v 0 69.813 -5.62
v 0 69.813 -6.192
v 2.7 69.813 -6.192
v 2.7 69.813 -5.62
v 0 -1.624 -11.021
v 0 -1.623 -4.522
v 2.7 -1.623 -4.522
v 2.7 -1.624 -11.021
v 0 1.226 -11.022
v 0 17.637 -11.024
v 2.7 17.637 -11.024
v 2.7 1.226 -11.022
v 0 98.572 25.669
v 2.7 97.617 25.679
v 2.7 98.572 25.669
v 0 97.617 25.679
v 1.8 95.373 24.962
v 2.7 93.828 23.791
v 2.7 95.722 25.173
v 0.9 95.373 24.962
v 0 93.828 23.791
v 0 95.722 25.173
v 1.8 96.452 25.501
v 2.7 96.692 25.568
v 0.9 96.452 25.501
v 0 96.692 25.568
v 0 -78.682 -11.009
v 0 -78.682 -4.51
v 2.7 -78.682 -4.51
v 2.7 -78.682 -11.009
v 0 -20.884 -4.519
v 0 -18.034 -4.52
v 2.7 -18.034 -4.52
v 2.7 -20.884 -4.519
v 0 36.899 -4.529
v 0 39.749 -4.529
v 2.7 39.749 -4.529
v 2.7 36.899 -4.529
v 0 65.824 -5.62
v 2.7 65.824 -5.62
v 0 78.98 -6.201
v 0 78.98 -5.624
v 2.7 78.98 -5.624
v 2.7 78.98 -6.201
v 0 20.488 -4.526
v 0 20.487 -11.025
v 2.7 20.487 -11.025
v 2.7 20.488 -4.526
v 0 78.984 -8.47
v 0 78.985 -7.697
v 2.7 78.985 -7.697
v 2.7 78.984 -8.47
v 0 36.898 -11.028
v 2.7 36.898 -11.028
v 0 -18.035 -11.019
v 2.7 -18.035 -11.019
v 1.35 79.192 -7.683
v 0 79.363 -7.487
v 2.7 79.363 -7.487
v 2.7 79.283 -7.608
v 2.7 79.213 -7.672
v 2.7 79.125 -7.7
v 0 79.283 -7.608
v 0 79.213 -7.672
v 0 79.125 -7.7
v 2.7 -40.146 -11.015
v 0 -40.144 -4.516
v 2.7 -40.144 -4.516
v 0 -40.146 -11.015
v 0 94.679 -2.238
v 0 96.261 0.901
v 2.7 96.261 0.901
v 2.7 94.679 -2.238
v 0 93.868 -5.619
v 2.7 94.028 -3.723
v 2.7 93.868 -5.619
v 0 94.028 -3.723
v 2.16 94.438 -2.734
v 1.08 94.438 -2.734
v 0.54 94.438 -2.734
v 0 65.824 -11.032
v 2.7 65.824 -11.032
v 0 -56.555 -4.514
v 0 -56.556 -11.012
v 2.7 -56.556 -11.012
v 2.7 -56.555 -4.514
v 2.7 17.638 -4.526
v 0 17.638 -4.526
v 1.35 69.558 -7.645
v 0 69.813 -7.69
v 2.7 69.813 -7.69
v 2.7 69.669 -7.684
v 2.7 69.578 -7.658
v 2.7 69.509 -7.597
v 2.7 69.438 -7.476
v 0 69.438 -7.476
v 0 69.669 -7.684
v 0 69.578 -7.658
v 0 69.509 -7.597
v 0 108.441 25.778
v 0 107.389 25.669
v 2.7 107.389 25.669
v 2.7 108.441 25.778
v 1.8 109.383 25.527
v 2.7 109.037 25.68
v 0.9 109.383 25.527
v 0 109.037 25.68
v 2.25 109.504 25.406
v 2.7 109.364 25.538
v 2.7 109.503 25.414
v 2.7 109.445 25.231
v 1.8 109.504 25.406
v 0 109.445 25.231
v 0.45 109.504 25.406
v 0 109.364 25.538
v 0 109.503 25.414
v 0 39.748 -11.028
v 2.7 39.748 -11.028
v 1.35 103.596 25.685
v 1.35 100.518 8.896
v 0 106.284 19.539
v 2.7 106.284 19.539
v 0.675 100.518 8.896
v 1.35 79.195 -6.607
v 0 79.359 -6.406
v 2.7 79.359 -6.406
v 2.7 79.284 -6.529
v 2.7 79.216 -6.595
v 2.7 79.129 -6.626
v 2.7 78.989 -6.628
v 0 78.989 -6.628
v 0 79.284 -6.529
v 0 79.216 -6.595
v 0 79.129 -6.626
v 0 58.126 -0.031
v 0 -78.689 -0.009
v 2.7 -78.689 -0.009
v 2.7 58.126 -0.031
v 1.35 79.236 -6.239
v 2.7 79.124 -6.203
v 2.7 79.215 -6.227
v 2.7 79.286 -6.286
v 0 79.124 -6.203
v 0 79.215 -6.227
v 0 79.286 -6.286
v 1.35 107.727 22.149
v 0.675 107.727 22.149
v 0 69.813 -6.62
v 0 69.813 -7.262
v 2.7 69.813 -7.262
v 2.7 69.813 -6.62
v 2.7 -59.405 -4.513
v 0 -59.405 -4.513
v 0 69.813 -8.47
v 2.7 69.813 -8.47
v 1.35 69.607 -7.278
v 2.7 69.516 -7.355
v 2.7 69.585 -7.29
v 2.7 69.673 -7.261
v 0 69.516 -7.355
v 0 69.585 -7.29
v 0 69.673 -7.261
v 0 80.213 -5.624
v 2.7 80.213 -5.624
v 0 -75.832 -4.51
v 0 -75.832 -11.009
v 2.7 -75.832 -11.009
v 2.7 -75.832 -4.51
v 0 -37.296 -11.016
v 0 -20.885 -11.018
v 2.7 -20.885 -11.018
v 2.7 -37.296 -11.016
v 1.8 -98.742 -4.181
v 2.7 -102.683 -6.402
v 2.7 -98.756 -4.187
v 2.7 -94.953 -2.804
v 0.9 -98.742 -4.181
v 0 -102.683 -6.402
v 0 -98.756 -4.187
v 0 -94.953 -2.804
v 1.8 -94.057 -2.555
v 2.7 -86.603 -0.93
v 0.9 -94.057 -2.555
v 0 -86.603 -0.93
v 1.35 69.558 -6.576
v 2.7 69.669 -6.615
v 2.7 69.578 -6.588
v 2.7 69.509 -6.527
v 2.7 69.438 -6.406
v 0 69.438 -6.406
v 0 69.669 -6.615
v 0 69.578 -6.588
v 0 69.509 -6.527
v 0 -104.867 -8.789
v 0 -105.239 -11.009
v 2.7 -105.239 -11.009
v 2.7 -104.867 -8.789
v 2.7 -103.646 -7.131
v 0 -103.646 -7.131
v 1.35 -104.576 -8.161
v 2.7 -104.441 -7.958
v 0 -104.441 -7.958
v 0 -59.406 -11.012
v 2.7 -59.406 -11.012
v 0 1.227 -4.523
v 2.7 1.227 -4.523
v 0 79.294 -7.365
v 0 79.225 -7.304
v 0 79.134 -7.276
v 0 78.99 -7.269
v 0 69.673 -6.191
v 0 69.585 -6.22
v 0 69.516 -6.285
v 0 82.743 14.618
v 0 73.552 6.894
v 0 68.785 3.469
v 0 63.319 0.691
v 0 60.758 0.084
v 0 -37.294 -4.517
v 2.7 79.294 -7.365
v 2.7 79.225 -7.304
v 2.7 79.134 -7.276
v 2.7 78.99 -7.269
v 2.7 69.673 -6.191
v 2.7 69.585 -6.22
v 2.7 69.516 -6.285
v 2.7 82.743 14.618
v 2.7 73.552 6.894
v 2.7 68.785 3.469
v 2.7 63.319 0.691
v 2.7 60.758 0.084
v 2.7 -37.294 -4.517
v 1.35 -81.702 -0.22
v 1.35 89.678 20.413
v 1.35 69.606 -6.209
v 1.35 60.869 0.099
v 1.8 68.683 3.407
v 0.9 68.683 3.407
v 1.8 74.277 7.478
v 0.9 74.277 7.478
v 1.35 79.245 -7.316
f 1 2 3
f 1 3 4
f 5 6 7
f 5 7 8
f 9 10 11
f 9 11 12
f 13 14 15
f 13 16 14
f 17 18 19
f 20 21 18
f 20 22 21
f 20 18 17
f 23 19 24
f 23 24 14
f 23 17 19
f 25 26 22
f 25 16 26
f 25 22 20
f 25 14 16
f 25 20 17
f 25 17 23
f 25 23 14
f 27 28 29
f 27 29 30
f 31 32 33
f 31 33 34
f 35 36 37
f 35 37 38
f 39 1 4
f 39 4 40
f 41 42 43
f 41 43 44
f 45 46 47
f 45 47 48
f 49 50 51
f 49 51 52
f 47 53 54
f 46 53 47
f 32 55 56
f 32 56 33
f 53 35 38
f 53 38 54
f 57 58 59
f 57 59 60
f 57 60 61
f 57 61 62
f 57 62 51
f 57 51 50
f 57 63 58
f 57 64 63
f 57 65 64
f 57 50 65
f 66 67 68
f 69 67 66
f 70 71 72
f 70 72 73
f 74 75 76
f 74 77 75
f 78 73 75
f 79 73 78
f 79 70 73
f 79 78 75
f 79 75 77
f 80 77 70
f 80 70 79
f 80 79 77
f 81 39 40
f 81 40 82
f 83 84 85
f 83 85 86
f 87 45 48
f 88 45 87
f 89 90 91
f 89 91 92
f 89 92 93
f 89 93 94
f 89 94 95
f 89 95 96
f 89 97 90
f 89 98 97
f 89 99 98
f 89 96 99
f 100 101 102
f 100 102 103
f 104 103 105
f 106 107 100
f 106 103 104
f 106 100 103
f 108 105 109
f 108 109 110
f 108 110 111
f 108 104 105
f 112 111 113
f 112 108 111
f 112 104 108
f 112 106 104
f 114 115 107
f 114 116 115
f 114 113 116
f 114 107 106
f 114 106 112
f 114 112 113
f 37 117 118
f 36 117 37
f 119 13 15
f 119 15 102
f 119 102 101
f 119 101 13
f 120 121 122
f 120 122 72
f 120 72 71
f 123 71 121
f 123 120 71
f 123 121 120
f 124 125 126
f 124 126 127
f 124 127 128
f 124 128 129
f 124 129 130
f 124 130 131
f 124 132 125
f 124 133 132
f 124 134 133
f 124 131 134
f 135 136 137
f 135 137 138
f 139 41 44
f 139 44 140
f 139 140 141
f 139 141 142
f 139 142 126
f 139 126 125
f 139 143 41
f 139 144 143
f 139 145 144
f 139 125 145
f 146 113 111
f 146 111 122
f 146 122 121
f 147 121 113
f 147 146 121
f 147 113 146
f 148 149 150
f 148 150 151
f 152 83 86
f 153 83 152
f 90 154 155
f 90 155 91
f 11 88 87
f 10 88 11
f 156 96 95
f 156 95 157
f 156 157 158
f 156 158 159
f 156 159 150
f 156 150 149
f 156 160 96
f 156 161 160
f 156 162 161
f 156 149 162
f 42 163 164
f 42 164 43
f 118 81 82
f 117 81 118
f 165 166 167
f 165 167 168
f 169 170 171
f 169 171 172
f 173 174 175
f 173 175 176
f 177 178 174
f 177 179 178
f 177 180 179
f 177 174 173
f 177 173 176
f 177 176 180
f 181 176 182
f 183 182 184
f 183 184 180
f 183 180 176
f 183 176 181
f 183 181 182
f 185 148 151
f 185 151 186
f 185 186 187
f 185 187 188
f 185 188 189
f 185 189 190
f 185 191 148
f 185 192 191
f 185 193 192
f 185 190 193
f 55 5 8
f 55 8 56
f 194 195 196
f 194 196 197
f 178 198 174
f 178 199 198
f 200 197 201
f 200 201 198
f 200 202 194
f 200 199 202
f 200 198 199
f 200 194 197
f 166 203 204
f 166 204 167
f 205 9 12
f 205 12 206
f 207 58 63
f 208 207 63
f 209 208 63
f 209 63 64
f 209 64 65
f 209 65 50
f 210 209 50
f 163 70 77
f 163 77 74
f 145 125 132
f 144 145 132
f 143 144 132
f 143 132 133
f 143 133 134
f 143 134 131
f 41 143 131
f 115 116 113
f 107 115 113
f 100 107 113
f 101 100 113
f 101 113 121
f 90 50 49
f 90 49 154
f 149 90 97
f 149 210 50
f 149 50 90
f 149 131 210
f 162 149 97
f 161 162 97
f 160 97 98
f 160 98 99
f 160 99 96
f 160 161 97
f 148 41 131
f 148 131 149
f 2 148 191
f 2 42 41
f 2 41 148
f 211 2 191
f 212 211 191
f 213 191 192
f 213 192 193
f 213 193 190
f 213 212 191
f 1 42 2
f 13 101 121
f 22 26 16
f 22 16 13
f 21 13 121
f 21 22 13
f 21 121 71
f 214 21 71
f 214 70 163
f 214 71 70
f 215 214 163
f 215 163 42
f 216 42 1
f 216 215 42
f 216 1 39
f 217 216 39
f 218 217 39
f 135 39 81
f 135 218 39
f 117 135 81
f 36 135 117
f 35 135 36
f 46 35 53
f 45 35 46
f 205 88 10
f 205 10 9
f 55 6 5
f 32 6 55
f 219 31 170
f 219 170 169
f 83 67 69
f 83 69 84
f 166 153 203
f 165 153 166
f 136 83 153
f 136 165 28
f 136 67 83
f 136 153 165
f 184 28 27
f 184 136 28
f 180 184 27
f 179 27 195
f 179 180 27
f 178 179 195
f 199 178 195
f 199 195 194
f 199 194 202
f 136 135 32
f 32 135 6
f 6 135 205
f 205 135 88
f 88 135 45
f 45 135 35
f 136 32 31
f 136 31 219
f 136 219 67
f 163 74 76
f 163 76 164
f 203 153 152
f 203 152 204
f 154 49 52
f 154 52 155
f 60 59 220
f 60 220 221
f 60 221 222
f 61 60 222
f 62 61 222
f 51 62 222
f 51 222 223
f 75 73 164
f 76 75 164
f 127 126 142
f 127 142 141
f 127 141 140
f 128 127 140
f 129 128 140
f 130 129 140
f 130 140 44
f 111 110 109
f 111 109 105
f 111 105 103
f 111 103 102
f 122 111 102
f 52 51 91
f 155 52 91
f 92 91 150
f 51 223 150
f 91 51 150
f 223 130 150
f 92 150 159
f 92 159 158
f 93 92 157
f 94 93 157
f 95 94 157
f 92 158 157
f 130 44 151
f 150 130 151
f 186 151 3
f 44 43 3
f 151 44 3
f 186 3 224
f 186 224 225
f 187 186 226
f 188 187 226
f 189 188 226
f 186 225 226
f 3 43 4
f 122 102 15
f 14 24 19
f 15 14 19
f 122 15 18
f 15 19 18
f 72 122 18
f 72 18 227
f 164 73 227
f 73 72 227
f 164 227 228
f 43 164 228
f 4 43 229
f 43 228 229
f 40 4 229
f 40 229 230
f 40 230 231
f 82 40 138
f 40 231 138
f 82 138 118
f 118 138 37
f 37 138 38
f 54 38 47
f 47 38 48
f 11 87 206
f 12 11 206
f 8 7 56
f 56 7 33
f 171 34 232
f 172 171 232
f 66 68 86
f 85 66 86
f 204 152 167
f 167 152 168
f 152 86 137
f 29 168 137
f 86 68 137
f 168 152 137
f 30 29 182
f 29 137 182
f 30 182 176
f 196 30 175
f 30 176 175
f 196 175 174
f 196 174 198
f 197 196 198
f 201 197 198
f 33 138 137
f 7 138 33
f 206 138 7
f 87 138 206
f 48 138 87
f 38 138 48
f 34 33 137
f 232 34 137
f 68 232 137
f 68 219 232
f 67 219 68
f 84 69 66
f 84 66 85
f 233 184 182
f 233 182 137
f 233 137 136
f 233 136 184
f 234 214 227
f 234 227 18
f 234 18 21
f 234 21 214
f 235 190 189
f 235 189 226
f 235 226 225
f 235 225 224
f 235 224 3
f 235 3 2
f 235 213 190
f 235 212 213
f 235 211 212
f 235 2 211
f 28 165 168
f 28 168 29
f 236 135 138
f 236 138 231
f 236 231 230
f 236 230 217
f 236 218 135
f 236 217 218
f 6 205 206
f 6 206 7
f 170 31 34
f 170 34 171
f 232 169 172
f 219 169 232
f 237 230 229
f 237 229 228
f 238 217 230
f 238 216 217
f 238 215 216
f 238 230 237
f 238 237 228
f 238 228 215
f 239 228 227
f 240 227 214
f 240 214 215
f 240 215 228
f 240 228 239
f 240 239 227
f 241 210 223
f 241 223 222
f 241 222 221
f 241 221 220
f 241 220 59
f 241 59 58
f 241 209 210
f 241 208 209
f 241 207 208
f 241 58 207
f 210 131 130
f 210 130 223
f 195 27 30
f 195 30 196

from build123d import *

# Parameters (mm, degrees)
SALIENTE_EXTRUIR1_DEPTH = 2.7


with BuildPart() as part:
    # Croquis1 → Saliente-Extruir1 (new body)
    with BuildSketch(Plane.YZ):
        with BuildLine():
            Line((69.812808286, -8.470319532), (69.813334046, -7.689593095))
            add(Edge.make_bspline(
                [(69.813334046, -7.689593095), (69.718277432, -7.690410058), (69.547216021, -7.691880338), (69.471672568, -7.54230989), (69.43809002, -7.475848405)],
                knots=[0, 0, 0, 0, 0.555650956, 1, 1, 1, 1], degree=3))
            add(Edge.make_bspline(
                [(69.43809002, -7.475848405), (69.485868998, -7.393671243), (69.571854074, -7.245781736), (69.739045293, -7.257082431), (69.813334046, -7.262103715)],
                knots=[0, 0, 0, 0, 0.555665944, 1, 1, 1, 1], degree=3))
            Line((69.813334046, -7.262103715), (69.813334046, -6.619874205))
            add(Edge.make_bspline(
                [(69.813334046, -6.619874205), (69.718281004, -6.62070628), (69.547206259, -6.62220393), (69.471672921, -6.472610717), (69.43809002, -6.406129515)],
                knots=[0, 0, 0, 0, 0.55558677, 1, 1, 1, 1], degree=3))
            add(Edge.make_bspline(
                [(69.43809002, -6.406129515), (69.485868647, -6.323952148), (69.571853089, -6.176062273), (69.739044357, -6.187362253), (69.813333131, -6.192383218)],
                knots=[0, 0, 0, 0, 0.555665944, 1, 1, 1, 1], degree=3))
            Line((69.813333131, -6.192383218), (69.812808286, -5.620390327))
            Line((69.812808286, -5.620390327), (65.824387706, -5.620390327))
            Line((65.824387706, -5.620390327), (65.823902281, -11.032305972))
            Line((65.823902281, -11.032305972), (39.747713095, -11.02806406))
            Line((39.747713095, -11.02806406), (39.748770289, -4.529207726))
            Line((39.748770289, -4.529207726), (36.898770326, -4.528744106))
            Line((36.898770326, -4.528744106), (36.897713133, -11.02760044))
            Line((36.897713133, -11.02760044), (20.486813862, -11.024930817))
            Line((20.486813862, -11.024930817), (20.487871055, -4.526074483))
            Line((20.487871055, -4.526074483), (17.637871093, -4.525610863))
            Line((17.637871093, -4.525610863), (17.636813899, -11.024467197))
            Line((17.636813899, -11.024467197), (1.226003887, -11.021797589))
            Line((1.226003887, -11.021797589), (1.22706108, -4.522941255))
            Line((1.22706108, -4.522941255), (-1.622938882, -4.522477635))
            Line((-1.622938882, -4.522477635), (-1.623996075, -11.021333969))
            Line((-1.623996075, -11.021333969), (-18.034716829, -11.018664376))
            Line((-18.034716829, -11.018664376), (-18.033659636, -4.519808041))
            Line((-18.033659636, -4.519808041), (-20.883659598, -4.519344421))
            Line((-20.883659598, -4.519344421), (-20.884716791, -11.018200756))
            Line((-20.884716791, -11.018200756), (-37.295526804, -11.015531148))
            Line((-37.295526804, -11.015531148), (-37.29446961, -4.516674813))
            Line((-37.29446961, -4.516674813), (-40.144469572, -4.516211193))
            Line((-40.144469572, -4.516211193), (-40.145526766, -11.015067527))
            Line((-40.145526766, -11.015067527), (-56.556426037, -11.012397905))
            Line((-56.556426037, -11.012397905), (-56.555368844, -4.51354157))
            Line((-56.555368844, -4.51354157), (-59.405368806, -4.51307795))
            Line((-59.405368806, -4.51307795), (-59.406426, -11.011934285))
            Line((-59.406426, -11.011934285), (-75.831996924, -11.009262276))
            Line((-75.831996924, -11.009262276), (-75.83152263, -4.510149615))
            Line((-75.83152263, -4.510149615), (-78.681522622, -4.509941627))
            Line((-78.681522622, -4.509941627), (-78.681996897, -11.008797361))
            Line((-78.681996897, -11.008797361), (-105.238788458, -11.008784177))
            add(Edge.make_bspline(
                [(-105.238788458, -11.008784177), (-105.14858271, -9.983450496), (-104.978798579, -8.052437708), (-103.415932971, -6.929206638), (-102.682870886, -6.402391424)],
                knots=[0, 0, 0, 0, 0.530982335, 1, 1, 1, 1], degree=3))
            add(Edge.make_bspline(
                [(-102.682870886, -6.402391424), (-101.394696585, -5.608529448), (-98.694632001, -3.944563162), (-93.215658737, -2.20965482), (-89.098251838, -1.412949472), (-86.602670214, -0.930072072)],
                knots=[0, 0, 0, 0, 0.264376639, 0.554143954, 1, 1, 1, 1], degree=3))
            add(Edge.make_bspline(
                [(-86.602670214, -0.930072072), (-84.973156703, -0.655698226), (-82.349752651, -0.213975311), (-79.694903541, -0.065172296), (-78.68908292, -0.008797357)],
                knots=[0, 0, 0, 0, 0.621144695, 1, 1, 1, 1], degree=3))
            Line((-78.68908292, -0.008797357), (58.126350502, -0.031053636))
            add(Edge.make_bspline(
                [(58.126350502, -0.031053636), (59.046945941, -0.03224198), (60.812517807, -0.034520976), (62.507529104, 0.456023838), (63.318712092, 0.690787646)],
                knots=[0, 0, 0, 0, 0.521422257, 1, 1, 1, 1], degree=3))
            add(Edge.make_bspline(
                [(63.318712092, 0.690787646), (65.143843319, 1.534523648), (69.06884794, 3.349005621), (75.404798534, 8.3094659), (79.947417099, 12.214266662), (82.743307297, 14.617606967)],
                knots=[0, 0, 0, 0, 0.250491315, 0.538689797, 1, 1, 1, 1], degree=3))
            add(Edge.make_bspline(
                [(82.743307297, 14.617606967), (85.047253105, 16.558828686), (88.71509394, 19.64921921), (92.441979531, 22.668023582), (93.827809061, 23.790572912)],
                knots=[0, 0, 0, 0, 0.628147706, 1, 1, 1, 1], degree=3))
            add(Edge.make_bspline(
                [(93.827809061, 23.790572912), (94.326453815, 24.199541627), (95.135569145, 24.863146035), (96.707492067, 25.728920147), (97.846009019, 25.692304846), (98.572307919, 25.668946364)],
                knots=[0, 0, 0, 0, 0.367687723, 0.596620683, 1, 1, 1, 1], degree=3))
            add(Edge.make_bspline(
                [(98.572307919, 25.668946364), (100.246973397, 25.678065075), (103.185898824, 25.694067802), (106.124806248, 25.676478931), (107.389032296, 25.668912593)],
                knots=[0, 0, 0, 0, 0.569822379, 1, 1, 1, 1], degree=3))
            add(Edge.make_bspline(
                [(107.389032296, 25.668912593), (108.060345413, 25.782878894), (108.783157194, 25.905587929), (109.548911413, 25.42625634), (109.482646974, 25.30201883), (109.444862485, 25.231273086)],
                knots=[0, 0, 0, 0, 0.848773339, 0.913885568, 1, 1, 1, 1], degree=3))
            add(Edge.make_bspline(
                [(109.444862485, 25.231273086), (109.370914057, 25.095380771), (109.105061218, 24.606832759), (108.522748832, 23.585003774), (107.54556697, 21.821989367), (106.764907477, 20.409086507), (106.284004774, 19.538728729)],
                knots=[0, 0, 0, 0, 0.071280186, 0.25626021, 0.541851204, 1, 1, 1, 1], degree=3))
            add(Edge.make_bspline(
                [(106.284004774, 19.538728729), (105.396909739, 17.909312095), (103.467658207, 14.365661847), (100.765990032, 9.360901344), (98.30554125, 4.781237125), (96.897745784, 2.110339814), (96.260543385, 0.901427017)],
                knots=[0, 0, 0, 0, 0.263007015, 0.571986842, 0.806270881, 1, 1, 1, 1], degree=3))
            add(Edge.make_bspline(
                [(96.260543385, 0.901427017), (95.874219388, 0.16818648), (95.240639904, -1.034343432), (94.500820955, -2.629812191), (93.945424943, -3.699029848), (93.988367719, -4.702342381), (93.914153339, -5.268329777), (93.868207957, -5.618726914)],
                knots=[0, 0, 0, 0, 0.352336975, 0.577840053, 0.756569684, 0.849294726, 1, 1, 1, 1], degree=3))
            Line((93.868207957, -5.618726914), (80.21346475, -5.623578454))
            Line((80.21346475, -5.623578454), (78.979630239, -5.623578454))
            Line((78.979630239, -5.623578454), (78.979601353, -6.200689117))
            add(Edge.make_bspline(
                [(78.979601353, -6.200689117), (79.074601125, -6.197779206), (79.245599405, -6.192542495), (79.324419315, -6.340422695), (79.359440945, -6.406129515)],
                knots=[0, 0, 0, 0, 0.555675338, 1, 1, 1, 1], degree=3))
            add(Edge.make_bspline(
                [(79.359440945, -6.406129515), (79.313479796, -6.48935539), (79.230789249, -6.639125118), (79.063383476, -6.631474374), (78.989003792, -6.628075089)],
                knots=[0, 0, 0, 0, 0.55569224, 1, 1, 1, 1], degree=3))
            Line((78.989003792, -6.628075089), (78.98995964, -7.269308448))
            add(Edge.make_bspline(
                [(78.98995964, -7.269308448), (79.085013314, -7.269607654), (79.256084268, -7.270146125), (79.329866383, -7.420596942), (79.36264575, -7.487448234)],
                knots=[0, 0, 0, 0, 0.555660155, 1, 1, 1, 1], degree=3))
            add(Edge.make_bspline(
                [(79.36264575, -7.487448234), (79.313911322, -7.569057991), (79.226204836, -7.715929624), (79.05916077, -7.702663194), (78.984935347, -7.696768304)],
                knots=[0, 0, 0, 0, 0.555653639, 1, 1, 1, 1], degree=3))
            Line((78.984935347, -7.696768304), (78.983701144, -8.470319532))
            Line((78.983701144, -8.470319532), (69.812808286, -8.470319532))
        make_face()
    extrude(amount=SALIENTE_EXTRUIR1_DEPTH)


solid = part.part
